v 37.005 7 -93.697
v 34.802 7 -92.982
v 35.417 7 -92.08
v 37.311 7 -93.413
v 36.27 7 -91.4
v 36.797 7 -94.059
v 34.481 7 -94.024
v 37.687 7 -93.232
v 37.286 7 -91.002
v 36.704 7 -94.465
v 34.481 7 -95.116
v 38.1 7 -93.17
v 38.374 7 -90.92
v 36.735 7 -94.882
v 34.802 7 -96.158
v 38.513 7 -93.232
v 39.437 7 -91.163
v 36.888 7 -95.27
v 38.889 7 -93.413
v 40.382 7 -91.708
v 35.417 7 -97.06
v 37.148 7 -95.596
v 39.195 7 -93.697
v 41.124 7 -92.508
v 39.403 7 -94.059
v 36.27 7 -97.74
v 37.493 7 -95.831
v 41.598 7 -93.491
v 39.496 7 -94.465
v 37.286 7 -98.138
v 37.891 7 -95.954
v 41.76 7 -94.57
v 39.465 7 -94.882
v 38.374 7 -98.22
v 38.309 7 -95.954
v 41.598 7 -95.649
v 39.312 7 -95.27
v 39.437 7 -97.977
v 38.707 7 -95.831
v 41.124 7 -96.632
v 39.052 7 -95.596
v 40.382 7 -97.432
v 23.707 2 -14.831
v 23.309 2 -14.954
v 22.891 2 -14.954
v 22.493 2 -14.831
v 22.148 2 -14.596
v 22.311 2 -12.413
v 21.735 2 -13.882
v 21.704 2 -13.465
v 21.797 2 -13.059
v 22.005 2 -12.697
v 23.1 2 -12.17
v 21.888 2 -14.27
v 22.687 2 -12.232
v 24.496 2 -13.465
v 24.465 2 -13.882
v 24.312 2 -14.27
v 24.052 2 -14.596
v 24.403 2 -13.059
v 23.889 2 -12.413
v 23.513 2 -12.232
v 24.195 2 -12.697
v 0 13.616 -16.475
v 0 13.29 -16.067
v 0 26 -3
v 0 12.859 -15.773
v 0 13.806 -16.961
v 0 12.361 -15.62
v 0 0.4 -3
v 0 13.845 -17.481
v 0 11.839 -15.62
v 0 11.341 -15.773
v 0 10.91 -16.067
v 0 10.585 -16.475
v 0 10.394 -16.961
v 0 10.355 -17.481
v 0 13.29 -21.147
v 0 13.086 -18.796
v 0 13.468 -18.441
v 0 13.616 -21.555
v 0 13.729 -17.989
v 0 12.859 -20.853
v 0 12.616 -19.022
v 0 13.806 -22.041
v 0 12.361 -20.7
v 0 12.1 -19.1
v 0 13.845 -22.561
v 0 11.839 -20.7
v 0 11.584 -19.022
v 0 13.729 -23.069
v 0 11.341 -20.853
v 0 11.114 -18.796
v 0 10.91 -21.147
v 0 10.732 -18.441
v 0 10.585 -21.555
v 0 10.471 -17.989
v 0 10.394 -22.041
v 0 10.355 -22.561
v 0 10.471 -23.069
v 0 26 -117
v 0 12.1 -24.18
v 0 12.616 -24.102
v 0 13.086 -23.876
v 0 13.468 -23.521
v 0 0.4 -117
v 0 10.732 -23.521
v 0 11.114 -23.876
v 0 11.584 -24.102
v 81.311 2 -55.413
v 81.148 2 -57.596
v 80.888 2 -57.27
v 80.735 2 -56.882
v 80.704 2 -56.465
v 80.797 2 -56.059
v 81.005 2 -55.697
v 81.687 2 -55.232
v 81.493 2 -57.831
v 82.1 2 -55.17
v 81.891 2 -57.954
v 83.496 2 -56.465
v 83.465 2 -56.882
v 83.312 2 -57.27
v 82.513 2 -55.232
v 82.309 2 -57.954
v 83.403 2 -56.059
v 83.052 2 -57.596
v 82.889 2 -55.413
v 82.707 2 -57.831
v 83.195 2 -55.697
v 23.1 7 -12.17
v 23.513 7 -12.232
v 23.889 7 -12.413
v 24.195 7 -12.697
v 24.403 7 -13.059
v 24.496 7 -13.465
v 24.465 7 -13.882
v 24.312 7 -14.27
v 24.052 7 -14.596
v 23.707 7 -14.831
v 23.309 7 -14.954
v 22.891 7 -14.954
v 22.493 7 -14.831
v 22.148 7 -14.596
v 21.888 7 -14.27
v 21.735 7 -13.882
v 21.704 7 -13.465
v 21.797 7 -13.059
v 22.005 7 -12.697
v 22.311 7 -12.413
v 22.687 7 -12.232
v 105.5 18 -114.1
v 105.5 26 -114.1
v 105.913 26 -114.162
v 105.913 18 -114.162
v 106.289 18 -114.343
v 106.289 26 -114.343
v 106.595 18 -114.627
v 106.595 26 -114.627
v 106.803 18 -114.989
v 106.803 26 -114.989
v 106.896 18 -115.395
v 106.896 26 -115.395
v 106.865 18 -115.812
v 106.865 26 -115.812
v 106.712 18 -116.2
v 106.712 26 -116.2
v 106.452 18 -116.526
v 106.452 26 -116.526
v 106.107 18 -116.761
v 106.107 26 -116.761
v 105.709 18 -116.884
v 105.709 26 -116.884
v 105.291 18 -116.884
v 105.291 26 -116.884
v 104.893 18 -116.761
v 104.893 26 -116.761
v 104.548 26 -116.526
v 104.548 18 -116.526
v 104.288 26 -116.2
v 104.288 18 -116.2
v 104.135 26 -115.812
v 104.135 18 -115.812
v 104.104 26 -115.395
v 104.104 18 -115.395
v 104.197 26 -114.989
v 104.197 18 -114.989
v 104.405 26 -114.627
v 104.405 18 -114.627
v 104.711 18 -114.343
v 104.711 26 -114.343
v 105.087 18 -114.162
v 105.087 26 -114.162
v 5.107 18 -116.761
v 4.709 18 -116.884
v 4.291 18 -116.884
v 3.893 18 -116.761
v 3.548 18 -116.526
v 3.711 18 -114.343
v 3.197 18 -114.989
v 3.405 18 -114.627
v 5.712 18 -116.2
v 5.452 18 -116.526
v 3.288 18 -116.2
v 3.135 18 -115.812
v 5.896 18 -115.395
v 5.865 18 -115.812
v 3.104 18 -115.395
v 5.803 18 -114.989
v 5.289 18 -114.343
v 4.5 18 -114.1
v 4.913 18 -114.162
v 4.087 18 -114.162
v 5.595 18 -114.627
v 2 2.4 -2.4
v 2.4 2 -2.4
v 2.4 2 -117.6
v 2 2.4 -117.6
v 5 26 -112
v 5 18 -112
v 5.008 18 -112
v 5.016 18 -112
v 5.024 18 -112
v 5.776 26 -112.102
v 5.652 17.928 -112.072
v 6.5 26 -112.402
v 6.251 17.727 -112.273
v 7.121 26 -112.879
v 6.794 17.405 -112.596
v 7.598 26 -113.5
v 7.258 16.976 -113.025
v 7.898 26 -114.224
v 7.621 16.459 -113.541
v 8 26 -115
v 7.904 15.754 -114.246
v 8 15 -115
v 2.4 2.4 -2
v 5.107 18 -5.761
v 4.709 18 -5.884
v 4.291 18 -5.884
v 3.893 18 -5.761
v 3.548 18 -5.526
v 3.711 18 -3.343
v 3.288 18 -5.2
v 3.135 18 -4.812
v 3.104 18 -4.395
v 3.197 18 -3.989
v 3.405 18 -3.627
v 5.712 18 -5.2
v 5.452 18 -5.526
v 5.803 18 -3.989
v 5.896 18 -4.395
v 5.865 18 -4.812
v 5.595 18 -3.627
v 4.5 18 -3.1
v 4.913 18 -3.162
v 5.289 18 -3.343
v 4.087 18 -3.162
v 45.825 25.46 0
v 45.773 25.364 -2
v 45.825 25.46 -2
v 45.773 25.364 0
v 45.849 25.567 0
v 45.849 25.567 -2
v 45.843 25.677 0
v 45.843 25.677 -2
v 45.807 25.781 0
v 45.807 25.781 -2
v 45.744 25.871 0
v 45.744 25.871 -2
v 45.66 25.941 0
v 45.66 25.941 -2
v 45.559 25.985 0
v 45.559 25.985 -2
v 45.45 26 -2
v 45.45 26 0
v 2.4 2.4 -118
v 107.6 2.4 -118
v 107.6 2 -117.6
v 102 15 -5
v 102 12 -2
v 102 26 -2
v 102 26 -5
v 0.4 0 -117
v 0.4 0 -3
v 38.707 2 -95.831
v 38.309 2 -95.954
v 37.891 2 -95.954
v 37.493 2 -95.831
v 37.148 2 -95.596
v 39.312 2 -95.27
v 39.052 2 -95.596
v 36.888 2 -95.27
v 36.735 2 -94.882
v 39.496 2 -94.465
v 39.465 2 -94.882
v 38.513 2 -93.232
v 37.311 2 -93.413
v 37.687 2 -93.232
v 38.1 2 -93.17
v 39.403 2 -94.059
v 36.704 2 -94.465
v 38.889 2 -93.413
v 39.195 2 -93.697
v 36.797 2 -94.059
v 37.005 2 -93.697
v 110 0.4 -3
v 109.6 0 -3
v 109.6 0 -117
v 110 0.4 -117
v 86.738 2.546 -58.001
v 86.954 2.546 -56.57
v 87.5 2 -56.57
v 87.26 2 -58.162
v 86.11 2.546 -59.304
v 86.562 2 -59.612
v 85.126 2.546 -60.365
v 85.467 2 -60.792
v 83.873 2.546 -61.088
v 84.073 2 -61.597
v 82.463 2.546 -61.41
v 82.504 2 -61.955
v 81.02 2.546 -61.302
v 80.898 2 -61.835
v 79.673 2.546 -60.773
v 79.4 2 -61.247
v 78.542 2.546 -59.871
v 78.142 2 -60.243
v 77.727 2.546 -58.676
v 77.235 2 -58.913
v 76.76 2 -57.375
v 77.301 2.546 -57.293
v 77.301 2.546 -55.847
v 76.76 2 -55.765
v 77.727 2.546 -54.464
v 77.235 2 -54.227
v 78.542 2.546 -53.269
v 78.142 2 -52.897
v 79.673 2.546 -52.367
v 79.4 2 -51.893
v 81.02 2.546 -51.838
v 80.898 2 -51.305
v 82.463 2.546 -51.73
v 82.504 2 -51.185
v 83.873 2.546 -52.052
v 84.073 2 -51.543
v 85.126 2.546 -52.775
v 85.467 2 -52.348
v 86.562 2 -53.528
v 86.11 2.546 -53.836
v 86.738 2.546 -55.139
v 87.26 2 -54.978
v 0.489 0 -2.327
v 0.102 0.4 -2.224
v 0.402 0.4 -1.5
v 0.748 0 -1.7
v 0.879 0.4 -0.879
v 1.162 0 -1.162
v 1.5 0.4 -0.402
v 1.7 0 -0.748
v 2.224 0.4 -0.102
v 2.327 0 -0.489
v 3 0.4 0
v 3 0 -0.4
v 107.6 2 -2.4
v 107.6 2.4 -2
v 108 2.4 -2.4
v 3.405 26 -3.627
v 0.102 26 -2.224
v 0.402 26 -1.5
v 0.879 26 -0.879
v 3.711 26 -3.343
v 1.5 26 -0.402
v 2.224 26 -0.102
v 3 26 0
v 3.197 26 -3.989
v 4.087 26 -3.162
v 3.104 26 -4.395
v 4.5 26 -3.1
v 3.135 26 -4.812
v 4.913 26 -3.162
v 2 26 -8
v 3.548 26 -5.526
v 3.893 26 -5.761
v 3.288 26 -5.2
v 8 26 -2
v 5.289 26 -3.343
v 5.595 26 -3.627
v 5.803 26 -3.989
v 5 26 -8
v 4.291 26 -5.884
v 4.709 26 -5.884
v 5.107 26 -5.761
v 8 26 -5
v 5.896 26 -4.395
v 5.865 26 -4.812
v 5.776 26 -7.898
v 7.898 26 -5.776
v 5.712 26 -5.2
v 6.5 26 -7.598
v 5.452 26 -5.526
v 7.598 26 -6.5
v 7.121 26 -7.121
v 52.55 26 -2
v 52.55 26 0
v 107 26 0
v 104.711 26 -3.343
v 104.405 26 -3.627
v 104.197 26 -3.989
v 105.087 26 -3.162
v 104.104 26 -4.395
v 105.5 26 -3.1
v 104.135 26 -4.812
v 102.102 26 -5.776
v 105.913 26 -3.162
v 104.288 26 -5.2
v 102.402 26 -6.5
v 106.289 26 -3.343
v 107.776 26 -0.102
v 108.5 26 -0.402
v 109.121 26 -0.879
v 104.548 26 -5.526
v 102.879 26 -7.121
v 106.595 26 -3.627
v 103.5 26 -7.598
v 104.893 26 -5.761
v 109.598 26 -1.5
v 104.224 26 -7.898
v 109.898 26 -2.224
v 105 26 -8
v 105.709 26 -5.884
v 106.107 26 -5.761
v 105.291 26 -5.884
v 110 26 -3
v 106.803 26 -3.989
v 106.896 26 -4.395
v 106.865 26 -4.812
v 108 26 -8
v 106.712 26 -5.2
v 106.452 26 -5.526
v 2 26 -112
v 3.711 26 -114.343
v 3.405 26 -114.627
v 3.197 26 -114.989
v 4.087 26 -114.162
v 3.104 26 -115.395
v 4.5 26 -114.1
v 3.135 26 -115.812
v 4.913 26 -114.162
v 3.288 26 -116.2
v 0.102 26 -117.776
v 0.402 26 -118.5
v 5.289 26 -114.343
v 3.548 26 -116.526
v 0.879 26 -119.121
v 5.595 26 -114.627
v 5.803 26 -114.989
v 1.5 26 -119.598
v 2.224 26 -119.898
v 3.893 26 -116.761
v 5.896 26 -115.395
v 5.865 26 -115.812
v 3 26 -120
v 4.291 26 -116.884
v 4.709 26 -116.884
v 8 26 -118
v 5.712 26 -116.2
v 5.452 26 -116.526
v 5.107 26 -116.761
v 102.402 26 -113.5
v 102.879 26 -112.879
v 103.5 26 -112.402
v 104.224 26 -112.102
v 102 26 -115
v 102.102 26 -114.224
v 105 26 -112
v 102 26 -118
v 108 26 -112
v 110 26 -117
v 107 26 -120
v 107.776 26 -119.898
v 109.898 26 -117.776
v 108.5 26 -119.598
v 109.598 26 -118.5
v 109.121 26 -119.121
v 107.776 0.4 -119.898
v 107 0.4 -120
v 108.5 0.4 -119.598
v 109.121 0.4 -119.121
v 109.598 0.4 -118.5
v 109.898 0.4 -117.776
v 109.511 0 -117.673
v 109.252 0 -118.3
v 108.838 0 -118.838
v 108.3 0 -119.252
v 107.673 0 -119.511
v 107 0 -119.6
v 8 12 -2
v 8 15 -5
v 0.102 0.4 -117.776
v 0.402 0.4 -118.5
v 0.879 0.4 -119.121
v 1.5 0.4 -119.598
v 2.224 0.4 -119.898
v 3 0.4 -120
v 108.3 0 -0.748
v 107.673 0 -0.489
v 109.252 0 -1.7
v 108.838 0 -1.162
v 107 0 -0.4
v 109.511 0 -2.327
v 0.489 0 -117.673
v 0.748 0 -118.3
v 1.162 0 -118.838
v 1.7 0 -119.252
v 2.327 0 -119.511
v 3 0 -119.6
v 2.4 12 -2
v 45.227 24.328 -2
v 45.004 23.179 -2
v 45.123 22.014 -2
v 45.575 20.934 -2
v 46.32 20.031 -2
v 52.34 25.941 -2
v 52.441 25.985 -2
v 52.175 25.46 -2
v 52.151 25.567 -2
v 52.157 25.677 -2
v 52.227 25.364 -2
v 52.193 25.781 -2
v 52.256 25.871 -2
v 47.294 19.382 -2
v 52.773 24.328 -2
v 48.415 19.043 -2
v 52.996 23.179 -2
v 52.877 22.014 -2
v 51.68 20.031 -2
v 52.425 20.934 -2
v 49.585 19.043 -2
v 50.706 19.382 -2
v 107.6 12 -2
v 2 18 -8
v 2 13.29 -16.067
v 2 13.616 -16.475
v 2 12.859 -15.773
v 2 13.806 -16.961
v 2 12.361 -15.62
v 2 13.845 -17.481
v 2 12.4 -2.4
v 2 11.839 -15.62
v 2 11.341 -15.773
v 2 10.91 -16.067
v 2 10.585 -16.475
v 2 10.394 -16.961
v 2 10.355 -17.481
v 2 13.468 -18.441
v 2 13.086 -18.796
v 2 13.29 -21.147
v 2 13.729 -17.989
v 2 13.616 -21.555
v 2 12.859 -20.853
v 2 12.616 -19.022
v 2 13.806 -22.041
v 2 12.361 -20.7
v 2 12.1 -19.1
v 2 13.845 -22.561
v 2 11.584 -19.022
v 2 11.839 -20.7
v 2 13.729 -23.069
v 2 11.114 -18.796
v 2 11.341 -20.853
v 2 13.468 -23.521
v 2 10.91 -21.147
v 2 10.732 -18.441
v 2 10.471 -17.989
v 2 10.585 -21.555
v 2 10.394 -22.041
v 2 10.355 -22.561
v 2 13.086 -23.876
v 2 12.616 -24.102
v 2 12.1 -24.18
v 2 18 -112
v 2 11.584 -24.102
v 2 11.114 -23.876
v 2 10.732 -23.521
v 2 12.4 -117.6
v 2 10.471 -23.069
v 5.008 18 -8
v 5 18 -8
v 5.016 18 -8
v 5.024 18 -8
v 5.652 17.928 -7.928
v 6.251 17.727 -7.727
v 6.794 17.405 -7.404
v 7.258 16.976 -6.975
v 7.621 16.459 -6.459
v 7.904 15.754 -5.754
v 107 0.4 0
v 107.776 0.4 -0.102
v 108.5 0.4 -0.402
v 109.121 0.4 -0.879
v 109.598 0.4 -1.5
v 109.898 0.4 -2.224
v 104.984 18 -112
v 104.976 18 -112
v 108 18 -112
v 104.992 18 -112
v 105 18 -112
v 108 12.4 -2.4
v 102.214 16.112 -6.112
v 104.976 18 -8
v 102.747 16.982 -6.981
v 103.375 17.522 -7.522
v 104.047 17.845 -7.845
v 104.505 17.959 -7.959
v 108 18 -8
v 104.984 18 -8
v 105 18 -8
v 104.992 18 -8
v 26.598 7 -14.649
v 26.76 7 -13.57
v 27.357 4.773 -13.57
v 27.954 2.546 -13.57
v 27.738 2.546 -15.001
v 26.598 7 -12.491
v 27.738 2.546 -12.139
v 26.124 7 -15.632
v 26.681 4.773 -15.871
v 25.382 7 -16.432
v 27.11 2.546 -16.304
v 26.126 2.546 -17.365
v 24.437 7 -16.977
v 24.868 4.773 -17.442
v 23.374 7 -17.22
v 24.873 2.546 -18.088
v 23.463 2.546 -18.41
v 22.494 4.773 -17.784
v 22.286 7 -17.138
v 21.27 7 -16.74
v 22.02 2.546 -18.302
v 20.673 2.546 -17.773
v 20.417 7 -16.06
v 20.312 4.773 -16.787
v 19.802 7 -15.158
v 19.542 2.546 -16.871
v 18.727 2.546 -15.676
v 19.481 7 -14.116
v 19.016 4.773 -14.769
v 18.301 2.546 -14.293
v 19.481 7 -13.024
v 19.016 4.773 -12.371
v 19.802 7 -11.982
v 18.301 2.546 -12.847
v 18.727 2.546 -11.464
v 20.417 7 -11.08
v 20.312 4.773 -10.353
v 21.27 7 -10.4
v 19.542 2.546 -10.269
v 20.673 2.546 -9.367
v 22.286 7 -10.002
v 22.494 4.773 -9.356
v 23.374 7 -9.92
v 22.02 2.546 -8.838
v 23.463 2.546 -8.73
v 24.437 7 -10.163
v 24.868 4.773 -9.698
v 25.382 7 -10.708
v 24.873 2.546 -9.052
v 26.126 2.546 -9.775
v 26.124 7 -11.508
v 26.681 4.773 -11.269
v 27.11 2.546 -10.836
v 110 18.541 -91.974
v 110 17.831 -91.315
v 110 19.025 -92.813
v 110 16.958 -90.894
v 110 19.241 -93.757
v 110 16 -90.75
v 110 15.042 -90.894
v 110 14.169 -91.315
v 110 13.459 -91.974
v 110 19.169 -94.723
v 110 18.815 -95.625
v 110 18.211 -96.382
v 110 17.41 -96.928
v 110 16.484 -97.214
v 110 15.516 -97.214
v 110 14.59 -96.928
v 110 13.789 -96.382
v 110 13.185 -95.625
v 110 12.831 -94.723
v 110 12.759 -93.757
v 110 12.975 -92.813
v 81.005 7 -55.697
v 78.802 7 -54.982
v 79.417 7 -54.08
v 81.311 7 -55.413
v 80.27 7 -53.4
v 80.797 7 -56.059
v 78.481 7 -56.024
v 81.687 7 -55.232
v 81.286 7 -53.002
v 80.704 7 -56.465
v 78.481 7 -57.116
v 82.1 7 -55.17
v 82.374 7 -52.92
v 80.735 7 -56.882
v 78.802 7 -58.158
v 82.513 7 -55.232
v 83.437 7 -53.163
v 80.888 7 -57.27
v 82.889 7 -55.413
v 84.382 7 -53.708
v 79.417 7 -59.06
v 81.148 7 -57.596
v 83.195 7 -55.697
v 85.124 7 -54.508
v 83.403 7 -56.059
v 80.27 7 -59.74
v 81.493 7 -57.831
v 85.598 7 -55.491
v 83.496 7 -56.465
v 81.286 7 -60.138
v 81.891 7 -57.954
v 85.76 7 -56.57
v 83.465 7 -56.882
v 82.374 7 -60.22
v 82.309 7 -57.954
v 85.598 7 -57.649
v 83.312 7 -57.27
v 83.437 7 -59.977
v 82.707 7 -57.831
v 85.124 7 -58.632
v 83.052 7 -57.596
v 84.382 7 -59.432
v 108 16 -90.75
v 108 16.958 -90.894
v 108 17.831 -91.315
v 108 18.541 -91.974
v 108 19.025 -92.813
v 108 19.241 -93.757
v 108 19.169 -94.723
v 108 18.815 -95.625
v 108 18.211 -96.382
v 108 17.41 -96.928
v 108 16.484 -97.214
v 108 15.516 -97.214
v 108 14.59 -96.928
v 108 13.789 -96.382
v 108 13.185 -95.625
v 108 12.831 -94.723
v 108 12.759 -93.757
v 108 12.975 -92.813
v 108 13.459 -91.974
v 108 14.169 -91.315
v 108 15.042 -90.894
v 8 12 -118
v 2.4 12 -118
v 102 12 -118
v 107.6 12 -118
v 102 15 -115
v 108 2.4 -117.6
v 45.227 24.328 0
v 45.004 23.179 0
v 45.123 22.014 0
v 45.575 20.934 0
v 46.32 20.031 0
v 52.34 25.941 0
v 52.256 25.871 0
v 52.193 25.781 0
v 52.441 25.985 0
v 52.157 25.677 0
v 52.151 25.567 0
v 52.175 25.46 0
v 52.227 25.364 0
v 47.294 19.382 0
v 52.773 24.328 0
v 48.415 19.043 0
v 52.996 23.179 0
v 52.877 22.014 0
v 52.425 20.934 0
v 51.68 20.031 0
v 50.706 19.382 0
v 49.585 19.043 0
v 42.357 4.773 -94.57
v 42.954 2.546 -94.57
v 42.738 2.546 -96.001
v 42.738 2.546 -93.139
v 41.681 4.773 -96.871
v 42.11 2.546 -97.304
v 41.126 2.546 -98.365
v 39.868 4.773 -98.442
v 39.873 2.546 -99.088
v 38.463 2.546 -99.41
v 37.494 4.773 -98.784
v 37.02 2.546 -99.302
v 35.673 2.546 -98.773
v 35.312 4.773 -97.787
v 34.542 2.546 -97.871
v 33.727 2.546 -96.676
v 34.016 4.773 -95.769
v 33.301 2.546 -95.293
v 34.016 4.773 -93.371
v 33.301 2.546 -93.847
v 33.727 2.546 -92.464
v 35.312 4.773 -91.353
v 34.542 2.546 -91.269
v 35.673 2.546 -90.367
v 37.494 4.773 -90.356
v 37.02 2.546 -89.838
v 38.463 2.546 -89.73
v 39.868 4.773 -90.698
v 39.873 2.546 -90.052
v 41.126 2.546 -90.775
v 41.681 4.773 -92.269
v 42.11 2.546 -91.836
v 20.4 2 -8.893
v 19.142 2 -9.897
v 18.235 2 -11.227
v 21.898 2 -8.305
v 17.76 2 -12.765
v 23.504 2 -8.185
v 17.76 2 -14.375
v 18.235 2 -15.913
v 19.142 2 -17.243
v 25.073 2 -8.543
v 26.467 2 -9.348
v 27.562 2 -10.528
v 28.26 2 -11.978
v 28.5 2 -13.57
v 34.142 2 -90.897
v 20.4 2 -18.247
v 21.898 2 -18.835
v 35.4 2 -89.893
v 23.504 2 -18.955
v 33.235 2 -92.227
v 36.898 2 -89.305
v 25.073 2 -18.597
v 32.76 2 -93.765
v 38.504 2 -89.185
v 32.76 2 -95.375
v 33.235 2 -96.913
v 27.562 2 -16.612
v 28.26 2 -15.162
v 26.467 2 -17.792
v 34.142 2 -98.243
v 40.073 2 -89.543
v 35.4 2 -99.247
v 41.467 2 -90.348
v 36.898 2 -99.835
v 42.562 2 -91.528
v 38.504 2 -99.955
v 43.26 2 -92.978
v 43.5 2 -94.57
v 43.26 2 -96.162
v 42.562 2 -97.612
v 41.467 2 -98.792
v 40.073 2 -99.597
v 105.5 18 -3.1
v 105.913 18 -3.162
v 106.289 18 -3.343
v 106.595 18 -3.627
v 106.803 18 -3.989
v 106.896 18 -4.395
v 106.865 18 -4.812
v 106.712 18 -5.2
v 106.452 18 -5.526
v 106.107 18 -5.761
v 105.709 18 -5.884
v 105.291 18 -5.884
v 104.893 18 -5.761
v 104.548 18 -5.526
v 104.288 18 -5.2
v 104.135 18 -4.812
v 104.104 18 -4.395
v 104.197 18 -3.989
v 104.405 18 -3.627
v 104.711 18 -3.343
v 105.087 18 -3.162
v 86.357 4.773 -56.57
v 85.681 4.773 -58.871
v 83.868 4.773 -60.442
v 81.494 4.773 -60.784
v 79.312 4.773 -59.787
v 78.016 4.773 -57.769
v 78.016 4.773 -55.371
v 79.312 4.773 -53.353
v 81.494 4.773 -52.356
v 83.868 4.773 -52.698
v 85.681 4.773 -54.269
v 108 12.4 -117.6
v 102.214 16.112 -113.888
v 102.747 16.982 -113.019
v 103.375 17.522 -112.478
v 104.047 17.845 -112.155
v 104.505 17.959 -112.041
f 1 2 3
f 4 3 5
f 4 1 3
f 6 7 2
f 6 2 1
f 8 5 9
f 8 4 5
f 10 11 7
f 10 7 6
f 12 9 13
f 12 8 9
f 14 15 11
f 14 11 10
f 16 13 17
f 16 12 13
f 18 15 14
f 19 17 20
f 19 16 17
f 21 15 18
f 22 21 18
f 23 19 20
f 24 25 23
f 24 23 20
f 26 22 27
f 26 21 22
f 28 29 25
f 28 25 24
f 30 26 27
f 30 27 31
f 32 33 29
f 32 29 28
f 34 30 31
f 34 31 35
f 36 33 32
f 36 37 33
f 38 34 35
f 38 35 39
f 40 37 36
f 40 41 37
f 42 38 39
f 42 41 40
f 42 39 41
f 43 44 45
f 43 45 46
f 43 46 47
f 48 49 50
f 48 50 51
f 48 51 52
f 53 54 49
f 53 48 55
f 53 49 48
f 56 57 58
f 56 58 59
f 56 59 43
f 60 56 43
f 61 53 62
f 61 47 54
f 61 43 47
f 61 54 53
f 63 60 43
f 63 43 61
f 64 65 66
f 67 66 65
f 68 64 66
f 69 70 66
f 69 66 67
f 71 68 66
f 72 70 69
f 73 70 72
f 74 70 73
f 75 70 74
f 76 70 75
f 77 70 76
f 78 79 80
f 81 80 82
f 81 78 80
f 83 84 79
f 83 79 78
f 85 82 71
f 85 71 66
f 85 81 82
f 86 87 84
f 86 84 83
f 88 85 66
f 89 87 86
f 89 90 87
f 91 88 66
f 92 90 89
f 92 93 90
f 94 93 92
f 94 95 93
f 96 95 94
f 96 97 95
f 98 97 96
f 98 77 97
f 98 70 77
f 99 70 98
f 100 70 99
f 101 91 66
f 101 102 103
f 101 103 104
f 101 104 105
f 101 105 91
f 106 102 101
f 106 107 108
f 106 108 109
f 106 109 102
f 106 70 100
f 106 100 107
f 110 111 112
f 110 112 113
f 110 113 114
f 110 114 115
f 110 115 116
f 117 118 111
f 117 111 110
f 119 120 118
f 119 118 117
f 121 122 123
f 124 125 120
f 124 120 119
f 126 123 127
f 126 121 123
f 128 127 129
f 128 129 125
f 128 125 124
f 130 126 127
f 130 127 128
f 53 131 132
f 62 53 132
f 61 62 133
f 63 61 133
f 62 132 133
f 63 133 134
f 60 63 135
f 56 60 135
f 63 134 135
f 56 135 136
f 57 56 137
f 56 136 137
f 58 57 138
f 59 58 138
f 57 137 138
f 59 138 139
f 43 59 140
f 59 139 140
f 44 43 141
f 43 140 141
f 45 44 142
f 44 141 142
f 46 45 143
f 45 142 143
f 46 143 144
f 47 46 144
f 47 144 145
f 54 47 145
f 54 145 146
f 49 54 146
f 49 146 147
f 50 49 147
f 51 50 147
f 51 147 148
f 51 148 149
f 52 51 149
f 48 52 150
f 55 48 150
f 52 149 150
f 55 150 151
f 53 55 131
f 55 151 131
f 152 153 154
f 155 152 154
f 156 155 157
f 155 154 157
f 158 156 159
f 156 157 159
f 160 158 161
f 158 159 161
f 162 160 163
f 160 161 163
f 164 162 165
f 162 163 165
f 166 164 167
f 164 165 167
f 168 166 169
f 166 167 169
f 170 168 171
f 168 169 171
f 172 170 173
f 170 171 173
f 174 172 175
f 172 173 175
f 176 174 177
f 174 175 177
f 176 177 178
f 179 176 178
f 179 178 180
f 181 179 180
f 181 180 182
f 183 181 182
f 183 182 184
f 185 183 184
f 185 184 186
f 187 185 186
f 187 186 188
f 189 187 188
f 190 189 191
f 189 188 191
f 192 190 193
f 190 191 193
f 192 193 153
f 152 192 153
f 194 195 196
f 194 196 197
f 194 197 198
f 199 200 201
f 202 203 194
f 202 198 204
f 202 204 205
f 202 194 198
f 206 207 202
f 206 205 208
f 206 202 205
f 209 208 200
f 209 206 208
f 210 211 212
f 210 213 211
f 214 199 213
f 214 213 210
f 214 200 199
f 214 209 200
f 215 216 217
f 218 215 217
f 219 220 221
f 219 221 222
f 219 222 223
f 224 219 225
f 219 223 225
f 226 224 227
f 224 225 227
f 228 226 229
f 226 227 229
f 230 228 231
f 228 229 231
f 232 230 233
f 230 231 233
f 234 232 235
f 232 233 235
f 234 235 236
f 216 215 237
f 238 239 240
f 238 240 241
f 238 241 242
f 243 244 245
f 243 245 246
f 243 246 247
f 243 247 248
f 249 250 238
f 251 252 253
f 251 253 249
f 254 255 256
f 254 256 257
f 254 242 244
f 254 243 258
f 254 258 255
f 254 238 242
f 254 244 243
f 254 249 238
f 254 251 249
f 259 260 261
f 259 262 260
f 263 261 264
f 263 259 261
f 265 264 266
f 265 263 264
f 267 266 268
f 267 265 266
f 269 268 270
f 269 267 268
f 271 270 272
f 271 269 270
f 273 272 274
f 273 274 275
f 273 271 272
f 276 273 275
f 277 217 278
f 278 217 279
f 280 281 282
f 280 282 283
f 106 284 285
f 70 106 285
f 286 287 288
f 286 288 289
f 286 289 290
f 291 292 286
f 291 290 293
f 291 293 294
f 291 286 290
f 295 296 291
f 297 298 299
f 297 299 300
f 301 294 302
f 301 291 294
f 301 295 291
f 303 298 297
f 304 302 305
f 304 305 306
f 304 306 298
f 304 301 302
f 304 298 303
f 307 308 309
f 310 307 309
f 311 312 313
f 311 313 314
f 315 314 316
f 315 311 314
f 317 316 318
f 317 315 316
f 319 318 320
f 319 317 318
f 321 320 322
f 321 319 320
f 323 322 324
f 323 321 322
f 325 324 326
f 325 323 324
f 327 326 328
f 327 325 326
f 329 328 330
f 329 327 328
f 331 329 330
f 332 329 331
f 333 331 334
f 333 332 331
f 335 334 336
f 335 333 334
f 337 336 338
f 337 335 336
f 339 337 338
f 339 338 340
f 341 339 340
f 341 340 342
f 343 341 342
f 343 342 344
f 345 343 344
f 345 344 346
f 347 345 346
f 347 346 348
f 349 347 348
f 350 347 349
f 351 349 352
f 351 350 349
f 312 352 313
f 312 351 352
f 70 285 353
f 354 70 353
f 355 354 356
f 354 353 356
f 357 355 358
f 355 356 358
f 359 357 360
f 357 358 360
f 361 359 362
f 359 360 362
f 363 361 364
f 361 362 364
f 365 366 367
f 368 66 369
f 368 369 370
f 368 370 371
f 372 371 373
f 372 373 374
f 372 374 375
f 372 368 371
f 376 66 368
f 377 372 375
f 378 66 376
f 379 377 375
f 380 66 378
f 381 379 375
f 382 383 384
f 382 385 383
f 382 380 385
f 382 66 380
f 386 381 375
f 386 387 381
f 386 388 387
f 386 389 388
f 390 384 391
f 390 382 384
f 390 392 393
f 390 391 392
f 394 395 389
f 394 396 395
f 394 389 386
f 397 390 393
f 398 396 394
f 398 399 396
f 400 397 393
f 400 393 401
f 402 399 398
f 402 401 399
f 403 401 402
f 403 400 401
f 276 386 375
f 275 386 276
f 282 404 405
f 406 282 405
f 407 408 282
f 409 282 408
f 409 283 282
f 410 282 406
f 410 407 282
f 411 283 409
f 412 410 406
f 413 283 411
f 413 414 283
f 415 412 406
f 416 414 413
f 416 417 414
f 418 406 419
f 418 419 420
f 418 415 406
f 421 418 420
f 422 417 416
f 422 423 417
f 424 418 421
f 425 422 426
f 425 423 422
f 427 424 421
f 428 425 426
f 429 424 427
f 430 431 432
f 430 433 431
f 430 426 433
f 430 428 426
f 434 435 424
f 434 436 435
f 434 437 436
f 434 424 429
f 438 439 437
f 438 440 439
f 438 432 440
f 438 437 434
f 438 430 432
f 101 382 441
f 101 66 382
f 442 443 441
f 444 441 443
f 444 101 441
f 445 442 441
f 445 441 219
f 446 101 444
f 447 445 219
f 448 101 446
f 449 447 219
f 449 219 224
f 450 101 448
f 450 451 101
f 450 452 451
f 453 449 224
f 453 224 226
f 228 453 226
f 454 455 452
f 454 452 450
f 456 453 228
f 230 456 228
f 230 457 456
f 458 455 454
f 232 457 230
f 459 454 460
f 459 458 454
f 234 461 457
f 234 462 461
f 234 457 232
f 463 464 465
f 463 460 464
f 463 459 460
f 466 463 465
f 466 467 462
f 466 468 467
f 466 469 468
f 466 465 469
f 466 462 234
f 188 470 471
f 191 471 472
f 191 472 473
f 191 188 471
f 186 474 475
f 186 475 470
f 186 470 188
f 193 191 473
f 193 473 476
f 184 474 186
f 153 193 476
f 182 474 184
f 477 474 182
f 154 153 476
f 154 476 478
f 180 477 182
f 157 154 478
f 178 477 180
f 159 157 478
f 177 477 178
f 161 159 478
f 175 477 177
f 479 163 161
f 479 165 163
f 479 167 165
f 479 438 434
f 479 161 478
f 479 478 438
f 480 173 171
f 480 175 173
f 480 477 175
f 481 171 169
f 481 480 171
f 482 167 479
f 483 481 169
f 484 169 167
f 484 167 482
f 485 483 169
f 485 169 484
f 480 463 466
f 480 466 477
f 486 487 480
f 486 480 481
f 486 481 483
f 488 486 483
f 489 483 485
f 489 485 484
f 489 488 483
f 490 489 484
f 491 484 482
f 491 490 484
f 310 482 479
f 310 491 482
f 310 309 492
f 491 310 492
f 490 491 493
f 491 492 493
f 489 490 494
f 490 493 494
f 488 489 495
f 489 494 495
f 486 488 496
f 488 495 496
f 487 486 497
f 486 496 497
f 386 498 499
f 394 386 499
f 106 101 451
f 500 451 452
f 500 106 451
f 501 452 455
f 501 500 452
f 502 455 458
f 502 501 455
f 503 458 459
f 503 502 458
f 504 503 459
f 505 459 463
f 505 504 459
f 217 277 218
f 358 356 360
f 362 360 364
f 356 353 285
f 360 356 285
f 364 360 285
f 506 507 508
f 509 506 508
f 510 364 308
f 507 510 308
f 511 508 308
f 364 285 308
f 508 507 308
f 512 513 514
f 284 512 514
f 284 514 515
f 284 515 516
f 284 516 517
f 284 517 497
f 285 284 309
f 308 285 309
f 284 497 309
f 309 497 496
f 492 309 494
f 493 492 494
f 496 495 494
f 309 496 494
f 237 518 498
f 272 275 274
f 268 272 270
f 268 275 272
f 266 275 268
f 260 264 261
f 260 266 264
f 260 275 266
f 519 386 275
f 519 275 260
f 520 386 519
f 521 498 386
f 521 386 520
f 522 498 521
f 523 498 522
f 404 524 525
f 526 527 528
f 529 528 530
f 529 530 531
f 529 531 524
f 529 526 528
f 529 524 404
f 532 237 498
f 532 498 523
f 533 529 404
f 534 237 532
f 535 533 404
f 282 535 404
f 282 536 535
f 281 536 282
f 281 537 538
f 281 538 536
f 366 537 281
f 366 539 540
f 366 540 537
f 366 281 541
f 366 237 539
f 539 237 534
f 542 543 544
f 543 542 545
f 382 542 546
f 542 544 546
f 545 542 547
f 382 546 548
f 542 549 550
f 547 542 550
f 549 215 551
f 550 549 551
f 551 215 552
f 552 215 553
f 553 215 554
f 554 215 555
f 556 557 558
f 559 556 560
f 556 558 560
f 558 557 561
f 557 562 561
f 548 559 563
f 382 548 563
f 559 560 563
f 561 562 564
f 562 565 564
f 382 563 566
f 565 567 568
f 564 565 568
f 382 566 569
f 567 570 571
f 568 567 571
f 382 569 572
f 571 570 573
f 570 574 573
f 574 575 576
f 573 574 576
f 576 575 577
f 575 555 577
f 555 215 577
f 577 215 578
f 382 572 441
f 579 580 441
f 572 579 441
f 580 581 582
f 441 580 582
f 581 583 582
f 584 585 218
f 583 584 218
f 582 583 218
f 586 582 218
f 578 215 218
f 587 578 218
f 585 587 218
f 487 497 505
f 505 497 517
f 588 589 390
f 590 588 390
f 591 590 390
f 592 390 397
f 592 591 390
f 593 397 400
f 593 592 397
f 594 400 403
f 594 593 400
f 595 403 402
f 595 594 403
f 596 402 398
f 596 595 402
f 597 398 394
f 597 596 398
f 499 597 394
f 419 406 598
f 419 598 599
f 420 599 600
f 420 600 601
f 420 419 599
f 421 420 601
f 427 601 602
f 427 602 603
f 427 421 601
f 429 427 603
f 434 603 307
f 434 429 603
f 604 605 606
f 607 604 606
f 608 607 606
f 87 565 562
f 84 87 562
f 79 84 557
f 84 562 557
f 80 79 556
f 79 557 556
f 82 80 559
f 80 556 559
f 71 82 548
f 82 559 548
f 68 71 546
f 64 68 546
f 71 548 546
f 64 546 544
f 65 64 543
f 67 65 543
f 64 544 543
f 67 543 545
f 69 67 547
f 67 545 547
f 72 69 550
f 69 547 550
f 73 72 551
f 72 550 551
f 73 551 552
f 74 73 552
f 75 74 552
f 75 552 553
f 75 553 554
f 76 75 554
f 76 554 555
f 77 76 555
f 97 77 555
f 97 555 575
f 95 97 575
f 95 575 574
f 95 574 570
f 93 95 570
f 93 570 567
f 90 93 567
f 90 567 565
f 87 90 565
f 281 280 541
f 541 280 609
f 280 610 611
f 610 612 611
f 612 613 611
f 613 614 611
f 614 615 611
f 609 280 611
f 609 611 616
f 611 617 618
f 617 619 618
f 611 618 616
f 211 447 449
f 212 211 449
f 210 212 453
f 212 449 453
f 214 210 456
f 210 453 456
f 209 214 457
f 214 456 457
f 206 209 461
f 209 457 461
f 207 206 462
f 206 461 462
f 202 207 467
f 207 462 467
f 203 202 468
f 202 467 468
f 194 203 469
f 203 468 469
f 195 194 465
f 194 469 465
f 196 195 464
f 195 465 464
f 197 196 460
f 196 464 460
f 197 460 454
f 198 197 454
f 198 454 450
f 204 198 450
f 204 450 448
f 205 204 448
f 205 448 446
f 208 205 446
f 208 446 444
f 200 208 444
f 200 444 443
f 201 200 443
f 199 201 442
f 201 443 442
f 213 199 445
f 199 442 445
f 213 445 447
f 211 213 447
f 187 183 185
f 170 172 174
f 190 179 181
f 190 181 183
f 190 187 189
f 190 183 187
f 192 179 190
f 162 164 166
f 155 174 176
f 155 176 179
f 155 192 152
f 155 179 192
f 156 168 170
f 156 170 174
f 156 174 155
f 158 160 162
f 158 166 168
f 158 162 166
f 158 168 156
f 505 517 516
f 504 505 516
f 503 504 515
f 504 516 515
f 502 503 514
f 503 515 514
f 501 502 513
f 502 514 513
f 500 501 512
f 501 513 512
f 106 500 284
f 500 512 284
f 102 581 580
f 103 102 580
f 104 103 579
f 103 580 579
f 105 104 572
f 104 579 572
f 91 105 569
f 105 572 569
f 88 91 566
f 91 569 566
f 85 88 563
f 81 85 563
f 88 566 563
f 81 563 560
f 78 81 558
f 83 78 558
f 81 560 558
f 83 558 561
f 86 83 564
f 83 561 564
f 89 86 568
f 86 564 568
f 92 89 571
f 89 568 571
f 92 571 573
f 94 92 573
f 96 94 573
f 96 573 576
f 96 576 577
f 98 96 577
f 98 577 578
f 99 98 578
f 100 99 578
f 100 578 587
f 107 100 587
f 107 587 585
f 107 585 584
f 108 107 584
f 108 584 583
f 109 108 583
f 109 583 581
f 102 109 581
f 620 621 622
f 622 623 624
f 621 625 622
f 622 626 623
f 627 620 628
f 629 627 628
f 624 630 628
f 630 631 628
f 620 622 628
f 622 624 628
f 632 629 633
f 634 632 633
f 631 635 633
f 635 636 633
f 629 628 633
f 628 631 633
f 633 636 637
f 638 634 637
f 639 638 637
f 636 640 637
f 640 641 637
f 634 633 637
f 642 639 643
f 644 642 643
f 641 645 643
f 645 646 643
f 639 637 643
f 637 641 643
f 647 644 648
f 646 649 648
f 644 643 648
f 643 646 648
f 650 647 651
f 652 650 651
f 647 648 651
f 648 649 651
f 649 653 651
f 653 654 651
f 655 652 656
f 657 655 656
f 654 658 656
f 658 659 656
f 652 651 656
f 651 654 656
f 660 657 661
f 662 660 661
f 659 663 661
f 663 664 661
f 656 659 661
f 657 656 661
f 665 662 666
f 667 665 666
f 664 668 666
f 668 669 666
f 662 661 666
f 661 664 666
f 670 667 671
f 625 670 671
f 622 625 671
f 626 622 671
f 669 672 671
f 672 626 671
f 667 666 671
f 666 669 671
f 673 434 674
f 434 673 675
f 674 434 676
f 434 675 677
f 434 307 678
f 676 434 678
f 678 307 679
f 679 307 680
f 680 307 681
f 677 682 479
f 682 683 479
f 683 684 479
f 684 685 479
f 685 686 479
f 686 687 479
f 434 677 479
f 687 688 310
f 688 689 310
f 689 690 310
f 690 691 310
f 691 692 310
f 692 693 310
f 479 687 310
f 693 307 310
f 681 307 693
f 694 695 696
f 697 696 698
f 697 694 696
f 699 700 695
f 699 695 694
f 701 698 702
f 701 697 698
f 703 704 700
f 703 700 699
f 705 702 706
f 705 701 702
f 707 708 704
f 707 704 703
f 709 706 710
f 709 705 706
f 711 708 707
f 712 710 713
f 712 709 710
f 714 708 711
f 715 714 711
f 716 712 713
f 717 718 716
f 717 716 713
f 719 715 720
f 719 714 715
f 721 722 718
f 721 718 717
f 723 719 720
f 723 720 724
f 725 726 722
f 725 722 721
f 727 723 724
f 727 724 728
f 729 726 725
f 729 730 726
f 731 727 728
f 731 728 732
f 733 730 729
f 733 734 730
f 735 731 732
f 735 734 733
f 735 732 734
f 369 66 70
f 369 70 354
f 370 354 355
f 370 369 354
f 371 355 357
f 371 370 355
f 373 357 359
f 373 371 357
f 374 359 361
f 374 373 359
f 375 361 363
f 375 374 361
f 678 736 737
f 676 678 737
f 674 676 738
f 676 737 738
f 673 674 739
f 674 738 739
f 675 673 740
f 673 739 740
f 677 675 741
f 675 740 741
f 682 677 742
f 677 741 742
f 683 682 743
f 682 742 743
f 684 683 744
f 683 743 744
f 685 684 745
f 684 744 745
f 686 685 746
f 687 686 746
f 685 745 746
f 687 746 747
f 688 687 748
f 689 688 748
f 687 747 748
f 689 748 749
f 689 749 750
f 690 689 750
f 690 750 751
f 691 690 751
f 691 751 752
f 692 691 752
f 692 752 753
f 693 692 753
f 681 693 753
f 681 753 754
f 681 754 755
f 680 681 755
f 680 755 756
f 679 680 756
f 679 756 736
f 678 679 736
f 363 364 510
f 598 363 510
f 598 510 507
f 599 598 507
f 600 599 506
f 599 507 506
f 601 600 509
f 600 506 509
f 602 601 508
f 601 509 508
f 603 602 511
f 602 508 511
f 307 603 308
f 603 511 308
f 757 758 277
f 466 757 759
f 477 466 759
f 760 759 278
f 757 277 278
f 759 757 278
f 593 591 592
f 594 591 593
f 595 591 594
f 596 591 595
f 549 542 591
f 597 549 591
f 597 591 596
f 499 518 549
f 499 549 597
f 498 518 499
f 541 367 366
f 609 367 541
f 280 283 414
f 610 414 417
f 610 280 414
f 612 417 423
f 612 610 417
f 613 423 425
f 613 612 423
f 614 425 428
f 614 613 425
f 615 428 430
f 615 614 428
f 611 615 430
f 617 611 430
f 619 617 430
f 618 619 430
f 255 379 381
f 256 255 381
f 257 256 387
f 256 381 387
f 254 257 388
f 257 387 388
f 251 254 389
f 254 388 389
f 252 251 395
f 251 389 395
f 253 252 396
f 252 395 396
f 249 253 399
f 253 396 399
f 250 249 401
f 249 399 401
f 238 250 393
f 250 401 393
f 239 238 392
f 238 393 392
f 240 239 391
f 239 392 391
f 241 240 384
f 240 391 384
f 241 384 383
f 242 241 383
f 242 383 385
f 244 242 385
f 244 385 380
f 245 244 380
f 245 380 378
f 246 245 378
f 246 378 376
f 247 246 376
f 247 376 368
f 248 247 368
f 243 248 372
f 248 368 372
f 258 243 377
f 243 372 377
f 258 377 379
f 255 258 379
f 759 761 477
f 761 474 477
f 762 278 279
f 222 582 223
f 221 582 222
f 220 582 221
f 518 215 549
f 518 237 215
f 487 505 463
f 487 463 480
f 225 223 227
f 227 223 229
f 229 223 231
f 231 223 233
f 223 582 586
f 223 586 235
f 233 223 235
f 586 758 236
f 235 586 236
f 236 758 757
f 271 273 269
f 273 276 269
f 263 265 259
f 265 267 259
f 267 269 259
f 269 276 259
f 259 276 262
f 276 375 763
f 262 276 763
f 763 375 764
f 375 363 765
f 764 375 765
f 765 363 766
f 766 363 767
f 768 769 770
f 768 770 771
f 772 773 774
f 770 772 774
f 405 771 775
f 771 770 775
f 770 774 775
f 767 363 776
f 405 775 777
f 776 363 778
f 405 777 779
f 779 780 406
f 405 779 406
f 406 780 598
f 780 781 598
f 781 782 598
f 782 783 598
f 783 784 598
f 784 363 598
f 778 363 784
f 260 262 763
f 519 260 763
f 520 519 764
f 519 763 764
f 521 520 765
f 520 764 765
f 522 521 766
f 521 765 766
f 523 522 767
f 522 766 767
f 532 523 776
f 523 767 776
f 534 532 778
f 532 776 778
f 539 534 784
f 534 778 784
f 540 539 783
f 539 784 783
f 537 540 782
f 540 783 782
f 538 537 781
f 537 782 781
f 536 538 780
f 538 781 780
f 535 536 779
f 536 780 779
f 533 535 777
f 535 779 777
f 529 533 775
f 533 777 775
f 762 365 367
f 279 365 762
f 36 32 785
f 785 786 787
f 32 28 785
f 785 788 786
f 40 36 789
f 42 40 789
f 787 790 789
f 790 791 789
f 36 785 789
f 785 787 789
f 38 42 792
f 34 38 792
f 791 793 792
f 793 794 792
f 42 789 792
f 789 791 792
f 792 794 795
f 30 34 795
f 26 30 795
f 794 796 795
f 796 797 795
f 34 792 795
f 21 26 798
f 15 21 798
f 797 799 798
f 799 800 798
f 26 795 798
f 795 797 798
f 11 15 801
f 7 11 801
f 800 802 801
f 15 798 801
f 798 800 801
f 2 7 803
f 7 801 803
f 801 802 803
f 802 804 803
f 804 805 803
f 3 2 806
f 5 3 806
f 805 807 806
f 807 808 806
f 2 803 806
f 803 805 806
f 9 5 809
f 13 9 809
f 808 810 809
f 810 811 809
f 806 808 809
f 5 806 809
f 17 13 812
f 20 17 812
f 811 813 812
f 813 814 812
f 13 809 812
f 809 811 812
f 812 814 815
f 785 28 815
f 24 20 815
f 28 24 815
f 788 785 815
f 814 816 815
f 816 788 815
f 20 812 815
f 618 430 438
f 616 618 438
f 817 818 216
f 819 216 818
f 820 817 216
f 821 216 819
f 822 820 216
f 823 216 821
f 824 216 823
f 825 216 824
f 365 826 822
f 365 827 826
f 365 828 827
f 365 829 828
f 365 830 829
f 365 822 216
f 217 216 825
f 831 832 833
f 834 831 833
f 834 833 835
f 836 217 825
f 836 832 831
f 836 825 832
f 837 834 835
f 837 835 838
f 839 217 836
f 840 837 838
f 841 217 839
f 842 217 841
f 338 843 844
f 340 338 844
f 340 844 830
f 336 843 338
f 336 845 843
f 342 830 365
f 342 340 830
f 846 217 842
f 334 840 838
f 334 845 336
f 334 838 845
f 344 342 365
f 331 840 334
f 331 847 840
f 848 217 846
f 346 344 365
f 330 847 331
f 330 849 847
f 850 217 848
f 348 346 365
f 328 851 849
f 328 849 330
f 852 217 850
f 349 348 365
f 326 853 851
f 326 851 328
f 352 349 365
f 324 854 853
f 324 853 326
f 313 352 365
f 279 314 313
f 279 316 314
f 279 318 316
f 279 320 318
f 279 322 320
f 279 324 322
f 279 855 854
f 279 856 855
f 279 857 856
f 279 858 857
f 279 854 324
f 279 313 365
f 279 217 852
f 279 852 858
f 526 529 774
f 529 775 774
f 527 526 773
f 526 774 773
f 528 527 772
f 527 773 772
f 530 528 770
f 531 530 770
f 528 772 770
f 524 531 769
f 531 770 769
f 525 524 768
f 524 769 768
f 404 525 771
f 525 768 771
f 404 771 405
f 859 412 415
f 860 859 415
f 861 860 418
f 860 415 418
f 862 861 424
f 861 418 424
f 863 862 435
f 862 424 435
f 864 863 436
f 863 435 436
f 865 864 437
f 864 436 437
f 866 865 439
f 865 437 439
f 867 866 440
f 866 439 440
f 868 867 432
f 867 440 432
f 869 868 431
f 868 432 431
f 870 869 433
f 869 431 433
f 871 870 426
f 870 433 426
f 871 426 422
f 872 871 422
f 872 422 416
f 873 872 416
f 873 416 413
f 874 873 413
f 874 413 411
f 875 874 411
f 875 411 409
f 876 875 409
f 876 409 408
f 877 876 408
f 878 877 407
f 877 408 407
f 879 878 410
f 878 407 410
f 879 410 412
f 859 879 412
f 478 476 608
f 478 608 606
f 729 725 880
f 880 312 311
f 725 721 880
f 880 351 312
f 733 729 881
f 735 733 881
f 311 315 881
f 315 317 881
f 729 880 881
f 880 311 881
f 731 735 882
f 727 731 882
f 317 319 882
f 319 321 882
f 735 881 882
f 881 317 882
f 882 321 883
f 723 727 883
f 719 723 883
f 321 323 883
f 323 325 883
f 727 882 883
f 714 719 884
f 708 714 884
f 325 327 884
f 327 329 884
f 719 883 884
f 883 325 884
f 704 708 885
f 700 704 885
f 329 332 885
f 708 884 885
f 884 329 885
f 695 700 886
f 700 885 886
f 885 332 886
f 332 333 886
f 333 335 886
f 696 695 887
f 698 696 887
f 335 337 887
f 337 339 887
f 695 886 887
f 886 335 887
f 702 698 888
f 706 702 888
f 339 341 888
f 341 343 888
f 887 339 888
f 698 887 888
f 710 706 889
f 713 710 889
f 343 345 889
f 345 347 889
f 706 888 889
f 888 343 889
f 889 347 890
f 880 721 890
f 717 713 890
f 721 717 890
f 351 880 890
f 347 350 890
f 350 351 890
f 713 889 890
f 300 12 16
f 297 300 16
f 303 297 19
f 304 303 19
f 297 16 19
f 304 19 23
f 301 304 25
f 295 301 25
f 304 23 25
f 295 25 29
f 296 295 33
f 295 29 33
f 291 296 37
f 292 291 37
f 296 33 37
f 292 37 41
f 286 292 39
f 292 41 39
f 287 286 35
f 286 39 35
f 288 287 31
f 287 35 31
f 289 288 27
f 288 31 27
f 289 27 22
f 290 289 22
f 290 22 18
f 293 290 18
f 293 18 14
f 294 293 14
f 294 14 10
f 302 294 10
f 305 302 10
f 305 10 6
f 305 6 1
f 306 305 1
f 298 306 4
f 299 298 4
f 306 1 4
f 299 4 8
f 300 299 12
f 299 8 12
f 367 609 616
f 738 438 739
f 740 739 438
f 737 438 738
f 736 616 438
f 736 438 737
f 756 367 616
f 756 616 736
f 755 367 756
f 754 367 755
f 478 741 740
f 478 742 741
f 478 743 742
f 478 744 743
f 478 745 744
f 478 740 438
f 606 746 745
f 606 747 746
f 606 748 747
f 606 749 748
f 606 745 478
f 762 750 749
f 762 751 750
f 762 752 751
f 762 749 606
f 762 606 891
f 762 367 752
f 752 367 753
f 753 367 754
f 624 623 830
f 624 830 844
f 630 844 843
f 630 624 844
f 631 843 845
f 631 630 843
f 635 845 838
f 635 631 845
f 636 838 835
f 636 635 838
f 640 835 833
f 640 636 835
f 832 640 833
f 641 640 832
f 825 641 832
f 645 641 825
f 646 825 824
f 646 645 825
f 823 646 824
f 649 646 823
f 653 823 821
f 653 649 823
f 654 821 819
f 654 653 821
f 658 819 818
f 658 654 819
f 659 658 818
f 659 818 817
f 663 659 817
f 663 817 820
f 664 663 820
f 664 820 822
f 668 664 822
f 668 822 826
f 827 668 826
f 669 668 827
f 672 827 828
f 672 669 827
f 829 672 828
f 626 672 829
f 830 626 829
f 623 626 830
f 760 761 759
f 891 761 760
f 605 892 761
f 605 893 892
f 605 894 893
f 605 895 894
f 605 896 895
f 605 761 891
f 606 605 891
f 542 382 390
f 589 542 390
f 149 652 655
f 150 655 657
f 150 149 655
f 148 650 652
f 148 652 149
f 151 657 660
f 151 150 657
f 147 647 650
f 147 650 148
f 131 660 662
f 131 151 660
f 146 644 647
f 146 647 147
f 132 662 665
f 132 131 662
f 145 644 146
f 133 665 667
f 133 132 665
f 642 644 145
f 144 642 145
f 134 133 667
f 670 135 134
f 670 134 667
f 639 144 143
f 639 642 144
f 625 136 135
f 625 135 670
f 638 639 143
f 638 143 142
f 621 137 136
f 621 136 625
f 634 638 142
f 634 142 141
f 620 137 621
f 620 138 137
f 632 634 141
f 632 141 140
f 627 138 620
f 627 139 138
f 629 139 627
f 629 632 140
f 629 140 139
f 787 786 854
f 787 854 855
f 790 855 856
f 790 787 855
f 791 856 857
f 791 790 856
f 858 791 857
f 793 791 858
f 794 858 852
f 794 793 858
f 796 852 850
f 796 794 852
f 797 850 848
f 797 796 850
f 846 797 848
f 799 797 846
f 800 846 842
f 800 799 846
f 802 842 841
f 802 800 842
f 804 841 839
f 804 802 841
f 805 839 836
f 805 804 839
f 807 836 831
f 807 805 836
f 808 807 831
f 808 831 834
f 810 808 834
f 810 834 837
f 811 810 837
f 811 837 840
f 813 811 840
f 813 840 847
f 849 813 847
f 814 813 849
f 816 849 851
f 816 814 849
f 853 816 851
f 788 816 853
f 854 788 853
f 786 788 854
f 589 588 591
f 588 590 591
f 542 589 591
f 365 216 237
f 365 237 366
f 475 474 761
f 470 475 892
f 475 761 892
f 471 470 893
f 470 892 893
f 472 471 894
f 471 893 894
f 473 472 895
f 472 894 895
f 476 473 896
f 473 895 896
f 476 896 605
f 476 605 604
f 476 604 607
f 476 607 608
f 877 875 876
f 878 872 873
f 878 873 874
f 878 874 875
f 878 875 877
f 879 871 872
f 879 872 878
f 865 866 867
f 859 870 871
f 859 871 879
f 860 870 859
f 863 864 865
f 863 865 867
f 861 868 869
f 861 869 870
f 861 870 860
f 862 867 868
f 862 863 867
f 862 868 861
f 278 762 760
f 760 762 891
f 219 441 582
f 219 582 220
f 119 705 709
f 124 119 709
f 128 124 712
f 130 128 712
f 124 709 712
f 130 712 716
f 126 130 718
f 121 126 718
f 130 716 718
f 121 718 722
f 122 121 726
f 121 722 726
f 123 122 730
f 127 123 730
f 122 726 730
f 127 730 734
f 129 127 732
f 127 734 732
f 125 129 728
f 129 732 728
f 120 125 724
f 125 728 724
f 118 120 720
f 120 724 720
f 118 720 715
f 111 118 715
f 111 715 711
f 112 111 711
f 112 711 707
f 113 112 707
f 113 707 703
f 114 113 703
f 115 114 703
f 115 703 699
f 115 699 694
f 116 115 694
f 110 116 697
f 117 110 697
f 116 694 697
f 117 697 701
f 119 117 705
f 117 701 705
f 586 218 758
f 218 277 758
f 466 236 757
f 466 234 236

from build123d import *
from OCP.BRepFilletAPI import BRepFilletAPI_MakeChamfer

# Parameters (mm, degrees)
SKETCH_1_W                = 110
SKETCH_1_H                = 120
EXTRUDE_1_DEPTH           = 2
SKETCH_2_R                = 5
EXTRUDE_2_DEPTH           = 5
EXTRUDE_2_DRAFT           = 15
EXTRUDE_2_PROFILE_2_DEPTH = 5
EXTRUDE_2_PROFILE_2_DRAFT = 15
EXTRUDE_2_PROFILE_3_DEPTH = 5
EXTRUDE_2_PROFILE_3_DRAFT = 15
SKETCH_3_R                = 1.4
CUT_EXTRUDE_1_DEPTH       = 5
SKETCH_4_W                = 110
SKETCH_4_H                = 120
SKETCH_4_W_2              = 106
SKETCH_4_H_2              = 116
EXTRUDE_3_DEPTH           = 24
SKETCH_5_W                = 6
SKETCH_5_H                = 6
EXTRUDE_4_DEPTH           = 8
CHAMFER_1_SIZE            = 6
SKETCH_6_R                = 1.4
CUT_EXTRUDE_2_DEPTH       = 8
FILLET_1_R                = 3
CHAMFER_2_SIZE            = 0.4
CHAMFER_3_SIZE            = 0.4
CHAMFER_3_SIZE2           = 0.565685425
SKETCH_8_R                = 4
CUT_EXTRUDE_3_DEPTH       = 3
FILLET_2_R                = 0.4
SKETCH_9_R                = 3.25
CUT_EXTRUDE_4_DEPTH       = 10
SKETCH_10_R               = 1.75
CUT_EXTRUDE_5_DEPTH       = 10


with BuildPart() as part:
    # 草图1 → 凸台-拉伸1 (new body)
    with BuildSketch(Plane(origin=(0, 0, 0), x_dir=(1, 0, 0), z_dir=(0, 1, 0))):
        with Locations((55, 60)):
            Rectangle(SKETCH_1_W, SKETCH_1_H)
    extrude(amount=EXTRUDE_1_DEPTH)


with BuildPart() as extrude_2_tool:
    # 草图2 → 凸台-拉伸2 (with draft: the straight prism first)
    with BuildSketch(Plane(origin=(0, 2, 0), x_dir=(1, 0, 0), z_dir=(0, 1, 0))):
        with Locations((82.1, 56.57)):
            Circle(SKETCH_2_R)
    extrude(amount=EXTRUDE_2_DEPTH)
    # 凸台-拉伸2: the draft: its side faces are tilted about the plane it starts from
    extrude_2_sides = [extrude_2_tool.faces().sort_by_distance(p)[0] for p in [
        (77.1, 4.5, -56.57),
    ]]
    draft(extrude_2_sides, Plane(origin=(0, 2, 0), x_dir=(1, 0, 0), z_dir=(0, 1, 0)), EXTRUDE_2_DRAFT)


with BuildPart() as part_1:
    add(part.part)

    # 凸台-拉伸2: add extrude_2_tool
    add(extrude_2_tool.part)


with BuildPart() as extrude_2_profile_2_tool:
    # 草图2 → 凸台-拉伸2 profile 2 (with draft: the straight prism first)
    with BuildSketch(Plane(origin=(0, 2, 0), x_dir=(1, 0, 0), z_dir=(0, 1, 0))):
        with Locations((38.1, 94.57)):
            Circle(SKETCH_2_R)
    extrude(amount=EXTRUDE_2_PROFILE_2_DEPTH)
    # 凸台-拉伸2 profile 2: the draft: its side faces are tilted about the plane it starts from
    extrude_2_profile_2_sides = [extrude_2_profile_2_tool.faces().sort_by_distance(p)[0] for p in [
        (33.1, 4.5, -94.57),
    ]]
    draft(extrude_2_profile_2_sides, Plane(origin=(0, 2, 0), x_dir=(1, 0, 0), z_dir=(0, 1, 0)), EXTRUDE_2_PROFILE_2_DRAFT)


with BuildPart() as part_2:
    add(part_1.part)

    # 凸台-拉伸2 profile 2: add extrude_2_profile_2_tool
    add(extrude_2_profile_2_tool.part)


with BuildPart() as extrude_2_profile_3_tool:
    # 草图2 → 凸台-拉伸2 profile 3 (with draft: the straight prism first)
    with BuildSketch(Plane(origin=(0, 2, 0), x_dir=(1, 0, 0), z_dir=(0, 1, 0))):
        with Locations((23.1, 13.57)):
            Circle(SKETCH_2_R)
    extrude(amount=EXTRUDE_2_PROFILE_3_DEPTH)
    # 凸台-拉伸2 profile 3: the draft: its side faces are tilted about the plane it starts from
    extrude_2_profile_3_sides = [extrude_2_profile_3_tool.faces().sort_by_distance(p)[0] for p in [
        (18.1, 4.5, -13.57),
    ]]
    draft(extrude_2_profile_3_sides, Plane(origin=(0, 2, 0), x_dir=(1, 0, 0), z_dir=(0, 1, 0)), EXTRUDE_2_PROFILE_3_DRAFT)


with BuildPart() as part_3:
    add(part_2.part)

    # 凸台-拉伸2 profile 3: add extrude_2_profile_3_tool
    add(extrude_2_profile_3_tool.part)

    # 草图3 → 切除-拉伸1 (cut)
    with BuildSketch(Plane(origin=(0, 7, 0), x_dir=(1, 0, 0), z_dir=(0, 1, 0))):
        with Locations(Location((82.1, 56.57, 0), (0, 0, 270))):
            Circle(SKETCH_3_R)
        with Locations(Location((38.1, 94.57, 0), (0, 0, 270))):
            Circle(SKETCH_3_R)
        with Locations(Location((23.1, 13.57, 0), (0, 0, 270))):
            Circle(SKETCH_3_R)
    extrude(amount=-CUT_EXTRUDE_1_DEPTH, mode=Mode.SUBTRACT)

    # 草图4 → 凸台-拉伸3 (add)
    with BuildSketch(Plane(origin=(0, 2, 0), x_dir=(1, 0, 0), z_dir=(0, 1, 0))):
        with Locations((55, 60)):
            Rectangle(SKETCH_4_W, SKETCH_4_H)
        with Locations((55, 60)):
            Rectangle(SKETCH_4_W_2, SKETCH_4_H_2, mode=Mode.SUBTRACT)
    extrude(amount=EXTRUDE_3_DEPTH)

    # 草图5 → 凸台-拉伸4 (add)
    with BuildSketch(Plane(origin=(0, 26, 0), x_dir=(1, 0, 0), z_dir=(0, 1, 0))):
        with Locations((5, 115)):
            Rectangle(SKETCH_5_W, SKETCH_5_H)
        with Locations((105, 115)):
            Rectangle(SKETCH_5_W, SKETCH_5_H)
        with Locations((105, 5)):
            Rectangle(SKETCH_5_W, SKETCH_5_H)
        with Locations((5, 5)):
            Rectangle(SKETCH_5_W, SKETCH_5_H)
    extrude(amount=-EXTRUDE_4_DEPTH)

    # 倒角1
    chamfer_1_edges = [part_3.edges().sort_by_distance(p)[0] for p in [
        (105, 18, -118),
        (5, 18, -118),
        (105, 18, -2),
        (5, 18, -2),
    ]]
    chamfer(chamfer_1_edges, length=CHAMFER_1_SIZE - 0.0001)  # a hair under: the kernel refuses the full size

    # 草图6 → 切除-拉伸2 (cut)
    with BuildSketch(Plane(origin=(0, 26, 0), x_dir=(1, 0, 0), z_dir=(0, 1, 0))):
        with Locations(Location((4.5, 115.5, 0), (0, 0, 270))):
            Circle(SKETCH_6_R)
        with Locations(Location((105.5, 115.5, 0), (0, 0, 270))):
            Circle(SKETCH_6_R)
        with Locations(Location((105.5, 4.5, 0), (0, 0, 270))):
            Circle(SKETCH_6_R)
        with Locations(Location((4.5, 4.5, 0), (0, 0, 270))):
            Circle(SKETCH_6_R)
    extrude(amount=-CUT_EXTRUDE_2_DEPTH, mode=Mode.SUBTRACT)

    # 圆角1
    fillet_1_edges = [part_3.edges().sort_by_distance(p)[0] for p in [
        (8, 22, -8),
        (8, 22, -112),
        (102, 22, -112),
        (0, 13, -120),
        (110, 13, -120),
        (110, 13, 0),
        (0, 13, 0),
        (102, 22, -8),
    ]]
    fillet(fillet_1_edges, radius=FILLET_1_R)

    # 倒角2
    chamfer_2_edges = [part_3.edges().sort_by_distance(p)[0] for p in [
        (55, 0, 0),
        (0, 0, -60),
        (55, 0, -120),
        (110, 0, -60),
        (0.878679656, 0, -119.121320344),
        (109.121320344, 0, -119.121320344),
        (109.121320344, 0, -0.878679656),
        (0.878679656, 0, -0.878679656),
    ]]
    chamfer(chamfer_2_edges, length=CHAMFER_2_SIZE)

    # 倒角3: one chamfer whose edges measure the first distance from different faces: ONE call of the kernel's chamfer builder (chamfer() names one face for all edges)
    chamfer_3_edges_1 = [part_3.edges().sort_by_distance(p)[0] for p in [
        (2, 7.00005, -118),
        (108, 7.00005, -118),
        (108, 7.00005, -2),
        (2, 7.00005, -2),
        (55, 2, -118),
        (2, 2, -60),
        (55, 2, -2),
        (108, 2, -60),
    ]]
    chamfer_3_edges_2 = [part_3.edges().sort_by_distance(p)[0] for p in [
        (77.1, 2, -56.57),
        (33.1, 2, -94.57),
        (18.1, 2, -13.57),
    ]]
    chamfer_3_side_2 = [part_3.faces().sort_by_distance(p)[0] for p in [
        (55.141315111, 2, -60.099571799),
    ]]
    chamfer_3 = BRepFilletAPI_MakeChamfer(part_3.part.solid().wrapped)
    for e in chamfer_3_edges_1:
        chamfer_3.Add(CHAMFER_3_SIZE, e.wrapped)
    for e in chamfer_3_edges_2:
        chamfer_3.Add(CHAMFER_3_SIZE, CHAMFER_3_SIZE2, e.wrapped, chamfer_3_side_2[0].wrapped)  # the first distance lies on this face
    add(Compound.cast(chamfer_3.Shape()), mode=Mode.REPLACE)

    # 草图8 → 切除-拉伸3 (cut)
    with BuildSketch(Plane.XY):
        with Locations((49, 23)):
            Circle(SKETCH_8_R)
    extrude(amount=-CUT_EXTRUDE_3_DEPTH, mode=Mode.SUBTRACT)

    # 圆角2
    fillet_2_edges = [part_3.edges().sort_by_distance(p)[0] for p in [
        (46.354248689, 26, -1),
        (51.645751311, 26, -1),
    ]]
    fillet(fillet_2_edges, radius=FILLET_2_R)

    # 草图9 → 切除-拉伸4 (cut)
    with BuildSketch(Plane.ZY.offset(-108)):
        with Locations((-94, 16)):
            Circle(SKETCH_9_R)
    extrude(amount=-CUT_EXTRUDE_4_DEPTH, mode=Mode.SUBTRACT)

    # 草图10 → 切除-拉伸5 (cut)
    with BuildSketch(Plane(origin=(2, 0, 0), x_dir=(0, 0, -1), z_dir=(1, 0, 0))):
        with Locations((22.430011451, 12.100047346)):
            Circle(SKETCH_10_R)
        with Locations((17.350013958, 12.100047346)):
            Circle(SKETCH_10_R)
    extrude(amount=-CUT_EXTRUDE_5_DEPTH, mode=Mode.SUBTRACT)


solid = part_3.part
